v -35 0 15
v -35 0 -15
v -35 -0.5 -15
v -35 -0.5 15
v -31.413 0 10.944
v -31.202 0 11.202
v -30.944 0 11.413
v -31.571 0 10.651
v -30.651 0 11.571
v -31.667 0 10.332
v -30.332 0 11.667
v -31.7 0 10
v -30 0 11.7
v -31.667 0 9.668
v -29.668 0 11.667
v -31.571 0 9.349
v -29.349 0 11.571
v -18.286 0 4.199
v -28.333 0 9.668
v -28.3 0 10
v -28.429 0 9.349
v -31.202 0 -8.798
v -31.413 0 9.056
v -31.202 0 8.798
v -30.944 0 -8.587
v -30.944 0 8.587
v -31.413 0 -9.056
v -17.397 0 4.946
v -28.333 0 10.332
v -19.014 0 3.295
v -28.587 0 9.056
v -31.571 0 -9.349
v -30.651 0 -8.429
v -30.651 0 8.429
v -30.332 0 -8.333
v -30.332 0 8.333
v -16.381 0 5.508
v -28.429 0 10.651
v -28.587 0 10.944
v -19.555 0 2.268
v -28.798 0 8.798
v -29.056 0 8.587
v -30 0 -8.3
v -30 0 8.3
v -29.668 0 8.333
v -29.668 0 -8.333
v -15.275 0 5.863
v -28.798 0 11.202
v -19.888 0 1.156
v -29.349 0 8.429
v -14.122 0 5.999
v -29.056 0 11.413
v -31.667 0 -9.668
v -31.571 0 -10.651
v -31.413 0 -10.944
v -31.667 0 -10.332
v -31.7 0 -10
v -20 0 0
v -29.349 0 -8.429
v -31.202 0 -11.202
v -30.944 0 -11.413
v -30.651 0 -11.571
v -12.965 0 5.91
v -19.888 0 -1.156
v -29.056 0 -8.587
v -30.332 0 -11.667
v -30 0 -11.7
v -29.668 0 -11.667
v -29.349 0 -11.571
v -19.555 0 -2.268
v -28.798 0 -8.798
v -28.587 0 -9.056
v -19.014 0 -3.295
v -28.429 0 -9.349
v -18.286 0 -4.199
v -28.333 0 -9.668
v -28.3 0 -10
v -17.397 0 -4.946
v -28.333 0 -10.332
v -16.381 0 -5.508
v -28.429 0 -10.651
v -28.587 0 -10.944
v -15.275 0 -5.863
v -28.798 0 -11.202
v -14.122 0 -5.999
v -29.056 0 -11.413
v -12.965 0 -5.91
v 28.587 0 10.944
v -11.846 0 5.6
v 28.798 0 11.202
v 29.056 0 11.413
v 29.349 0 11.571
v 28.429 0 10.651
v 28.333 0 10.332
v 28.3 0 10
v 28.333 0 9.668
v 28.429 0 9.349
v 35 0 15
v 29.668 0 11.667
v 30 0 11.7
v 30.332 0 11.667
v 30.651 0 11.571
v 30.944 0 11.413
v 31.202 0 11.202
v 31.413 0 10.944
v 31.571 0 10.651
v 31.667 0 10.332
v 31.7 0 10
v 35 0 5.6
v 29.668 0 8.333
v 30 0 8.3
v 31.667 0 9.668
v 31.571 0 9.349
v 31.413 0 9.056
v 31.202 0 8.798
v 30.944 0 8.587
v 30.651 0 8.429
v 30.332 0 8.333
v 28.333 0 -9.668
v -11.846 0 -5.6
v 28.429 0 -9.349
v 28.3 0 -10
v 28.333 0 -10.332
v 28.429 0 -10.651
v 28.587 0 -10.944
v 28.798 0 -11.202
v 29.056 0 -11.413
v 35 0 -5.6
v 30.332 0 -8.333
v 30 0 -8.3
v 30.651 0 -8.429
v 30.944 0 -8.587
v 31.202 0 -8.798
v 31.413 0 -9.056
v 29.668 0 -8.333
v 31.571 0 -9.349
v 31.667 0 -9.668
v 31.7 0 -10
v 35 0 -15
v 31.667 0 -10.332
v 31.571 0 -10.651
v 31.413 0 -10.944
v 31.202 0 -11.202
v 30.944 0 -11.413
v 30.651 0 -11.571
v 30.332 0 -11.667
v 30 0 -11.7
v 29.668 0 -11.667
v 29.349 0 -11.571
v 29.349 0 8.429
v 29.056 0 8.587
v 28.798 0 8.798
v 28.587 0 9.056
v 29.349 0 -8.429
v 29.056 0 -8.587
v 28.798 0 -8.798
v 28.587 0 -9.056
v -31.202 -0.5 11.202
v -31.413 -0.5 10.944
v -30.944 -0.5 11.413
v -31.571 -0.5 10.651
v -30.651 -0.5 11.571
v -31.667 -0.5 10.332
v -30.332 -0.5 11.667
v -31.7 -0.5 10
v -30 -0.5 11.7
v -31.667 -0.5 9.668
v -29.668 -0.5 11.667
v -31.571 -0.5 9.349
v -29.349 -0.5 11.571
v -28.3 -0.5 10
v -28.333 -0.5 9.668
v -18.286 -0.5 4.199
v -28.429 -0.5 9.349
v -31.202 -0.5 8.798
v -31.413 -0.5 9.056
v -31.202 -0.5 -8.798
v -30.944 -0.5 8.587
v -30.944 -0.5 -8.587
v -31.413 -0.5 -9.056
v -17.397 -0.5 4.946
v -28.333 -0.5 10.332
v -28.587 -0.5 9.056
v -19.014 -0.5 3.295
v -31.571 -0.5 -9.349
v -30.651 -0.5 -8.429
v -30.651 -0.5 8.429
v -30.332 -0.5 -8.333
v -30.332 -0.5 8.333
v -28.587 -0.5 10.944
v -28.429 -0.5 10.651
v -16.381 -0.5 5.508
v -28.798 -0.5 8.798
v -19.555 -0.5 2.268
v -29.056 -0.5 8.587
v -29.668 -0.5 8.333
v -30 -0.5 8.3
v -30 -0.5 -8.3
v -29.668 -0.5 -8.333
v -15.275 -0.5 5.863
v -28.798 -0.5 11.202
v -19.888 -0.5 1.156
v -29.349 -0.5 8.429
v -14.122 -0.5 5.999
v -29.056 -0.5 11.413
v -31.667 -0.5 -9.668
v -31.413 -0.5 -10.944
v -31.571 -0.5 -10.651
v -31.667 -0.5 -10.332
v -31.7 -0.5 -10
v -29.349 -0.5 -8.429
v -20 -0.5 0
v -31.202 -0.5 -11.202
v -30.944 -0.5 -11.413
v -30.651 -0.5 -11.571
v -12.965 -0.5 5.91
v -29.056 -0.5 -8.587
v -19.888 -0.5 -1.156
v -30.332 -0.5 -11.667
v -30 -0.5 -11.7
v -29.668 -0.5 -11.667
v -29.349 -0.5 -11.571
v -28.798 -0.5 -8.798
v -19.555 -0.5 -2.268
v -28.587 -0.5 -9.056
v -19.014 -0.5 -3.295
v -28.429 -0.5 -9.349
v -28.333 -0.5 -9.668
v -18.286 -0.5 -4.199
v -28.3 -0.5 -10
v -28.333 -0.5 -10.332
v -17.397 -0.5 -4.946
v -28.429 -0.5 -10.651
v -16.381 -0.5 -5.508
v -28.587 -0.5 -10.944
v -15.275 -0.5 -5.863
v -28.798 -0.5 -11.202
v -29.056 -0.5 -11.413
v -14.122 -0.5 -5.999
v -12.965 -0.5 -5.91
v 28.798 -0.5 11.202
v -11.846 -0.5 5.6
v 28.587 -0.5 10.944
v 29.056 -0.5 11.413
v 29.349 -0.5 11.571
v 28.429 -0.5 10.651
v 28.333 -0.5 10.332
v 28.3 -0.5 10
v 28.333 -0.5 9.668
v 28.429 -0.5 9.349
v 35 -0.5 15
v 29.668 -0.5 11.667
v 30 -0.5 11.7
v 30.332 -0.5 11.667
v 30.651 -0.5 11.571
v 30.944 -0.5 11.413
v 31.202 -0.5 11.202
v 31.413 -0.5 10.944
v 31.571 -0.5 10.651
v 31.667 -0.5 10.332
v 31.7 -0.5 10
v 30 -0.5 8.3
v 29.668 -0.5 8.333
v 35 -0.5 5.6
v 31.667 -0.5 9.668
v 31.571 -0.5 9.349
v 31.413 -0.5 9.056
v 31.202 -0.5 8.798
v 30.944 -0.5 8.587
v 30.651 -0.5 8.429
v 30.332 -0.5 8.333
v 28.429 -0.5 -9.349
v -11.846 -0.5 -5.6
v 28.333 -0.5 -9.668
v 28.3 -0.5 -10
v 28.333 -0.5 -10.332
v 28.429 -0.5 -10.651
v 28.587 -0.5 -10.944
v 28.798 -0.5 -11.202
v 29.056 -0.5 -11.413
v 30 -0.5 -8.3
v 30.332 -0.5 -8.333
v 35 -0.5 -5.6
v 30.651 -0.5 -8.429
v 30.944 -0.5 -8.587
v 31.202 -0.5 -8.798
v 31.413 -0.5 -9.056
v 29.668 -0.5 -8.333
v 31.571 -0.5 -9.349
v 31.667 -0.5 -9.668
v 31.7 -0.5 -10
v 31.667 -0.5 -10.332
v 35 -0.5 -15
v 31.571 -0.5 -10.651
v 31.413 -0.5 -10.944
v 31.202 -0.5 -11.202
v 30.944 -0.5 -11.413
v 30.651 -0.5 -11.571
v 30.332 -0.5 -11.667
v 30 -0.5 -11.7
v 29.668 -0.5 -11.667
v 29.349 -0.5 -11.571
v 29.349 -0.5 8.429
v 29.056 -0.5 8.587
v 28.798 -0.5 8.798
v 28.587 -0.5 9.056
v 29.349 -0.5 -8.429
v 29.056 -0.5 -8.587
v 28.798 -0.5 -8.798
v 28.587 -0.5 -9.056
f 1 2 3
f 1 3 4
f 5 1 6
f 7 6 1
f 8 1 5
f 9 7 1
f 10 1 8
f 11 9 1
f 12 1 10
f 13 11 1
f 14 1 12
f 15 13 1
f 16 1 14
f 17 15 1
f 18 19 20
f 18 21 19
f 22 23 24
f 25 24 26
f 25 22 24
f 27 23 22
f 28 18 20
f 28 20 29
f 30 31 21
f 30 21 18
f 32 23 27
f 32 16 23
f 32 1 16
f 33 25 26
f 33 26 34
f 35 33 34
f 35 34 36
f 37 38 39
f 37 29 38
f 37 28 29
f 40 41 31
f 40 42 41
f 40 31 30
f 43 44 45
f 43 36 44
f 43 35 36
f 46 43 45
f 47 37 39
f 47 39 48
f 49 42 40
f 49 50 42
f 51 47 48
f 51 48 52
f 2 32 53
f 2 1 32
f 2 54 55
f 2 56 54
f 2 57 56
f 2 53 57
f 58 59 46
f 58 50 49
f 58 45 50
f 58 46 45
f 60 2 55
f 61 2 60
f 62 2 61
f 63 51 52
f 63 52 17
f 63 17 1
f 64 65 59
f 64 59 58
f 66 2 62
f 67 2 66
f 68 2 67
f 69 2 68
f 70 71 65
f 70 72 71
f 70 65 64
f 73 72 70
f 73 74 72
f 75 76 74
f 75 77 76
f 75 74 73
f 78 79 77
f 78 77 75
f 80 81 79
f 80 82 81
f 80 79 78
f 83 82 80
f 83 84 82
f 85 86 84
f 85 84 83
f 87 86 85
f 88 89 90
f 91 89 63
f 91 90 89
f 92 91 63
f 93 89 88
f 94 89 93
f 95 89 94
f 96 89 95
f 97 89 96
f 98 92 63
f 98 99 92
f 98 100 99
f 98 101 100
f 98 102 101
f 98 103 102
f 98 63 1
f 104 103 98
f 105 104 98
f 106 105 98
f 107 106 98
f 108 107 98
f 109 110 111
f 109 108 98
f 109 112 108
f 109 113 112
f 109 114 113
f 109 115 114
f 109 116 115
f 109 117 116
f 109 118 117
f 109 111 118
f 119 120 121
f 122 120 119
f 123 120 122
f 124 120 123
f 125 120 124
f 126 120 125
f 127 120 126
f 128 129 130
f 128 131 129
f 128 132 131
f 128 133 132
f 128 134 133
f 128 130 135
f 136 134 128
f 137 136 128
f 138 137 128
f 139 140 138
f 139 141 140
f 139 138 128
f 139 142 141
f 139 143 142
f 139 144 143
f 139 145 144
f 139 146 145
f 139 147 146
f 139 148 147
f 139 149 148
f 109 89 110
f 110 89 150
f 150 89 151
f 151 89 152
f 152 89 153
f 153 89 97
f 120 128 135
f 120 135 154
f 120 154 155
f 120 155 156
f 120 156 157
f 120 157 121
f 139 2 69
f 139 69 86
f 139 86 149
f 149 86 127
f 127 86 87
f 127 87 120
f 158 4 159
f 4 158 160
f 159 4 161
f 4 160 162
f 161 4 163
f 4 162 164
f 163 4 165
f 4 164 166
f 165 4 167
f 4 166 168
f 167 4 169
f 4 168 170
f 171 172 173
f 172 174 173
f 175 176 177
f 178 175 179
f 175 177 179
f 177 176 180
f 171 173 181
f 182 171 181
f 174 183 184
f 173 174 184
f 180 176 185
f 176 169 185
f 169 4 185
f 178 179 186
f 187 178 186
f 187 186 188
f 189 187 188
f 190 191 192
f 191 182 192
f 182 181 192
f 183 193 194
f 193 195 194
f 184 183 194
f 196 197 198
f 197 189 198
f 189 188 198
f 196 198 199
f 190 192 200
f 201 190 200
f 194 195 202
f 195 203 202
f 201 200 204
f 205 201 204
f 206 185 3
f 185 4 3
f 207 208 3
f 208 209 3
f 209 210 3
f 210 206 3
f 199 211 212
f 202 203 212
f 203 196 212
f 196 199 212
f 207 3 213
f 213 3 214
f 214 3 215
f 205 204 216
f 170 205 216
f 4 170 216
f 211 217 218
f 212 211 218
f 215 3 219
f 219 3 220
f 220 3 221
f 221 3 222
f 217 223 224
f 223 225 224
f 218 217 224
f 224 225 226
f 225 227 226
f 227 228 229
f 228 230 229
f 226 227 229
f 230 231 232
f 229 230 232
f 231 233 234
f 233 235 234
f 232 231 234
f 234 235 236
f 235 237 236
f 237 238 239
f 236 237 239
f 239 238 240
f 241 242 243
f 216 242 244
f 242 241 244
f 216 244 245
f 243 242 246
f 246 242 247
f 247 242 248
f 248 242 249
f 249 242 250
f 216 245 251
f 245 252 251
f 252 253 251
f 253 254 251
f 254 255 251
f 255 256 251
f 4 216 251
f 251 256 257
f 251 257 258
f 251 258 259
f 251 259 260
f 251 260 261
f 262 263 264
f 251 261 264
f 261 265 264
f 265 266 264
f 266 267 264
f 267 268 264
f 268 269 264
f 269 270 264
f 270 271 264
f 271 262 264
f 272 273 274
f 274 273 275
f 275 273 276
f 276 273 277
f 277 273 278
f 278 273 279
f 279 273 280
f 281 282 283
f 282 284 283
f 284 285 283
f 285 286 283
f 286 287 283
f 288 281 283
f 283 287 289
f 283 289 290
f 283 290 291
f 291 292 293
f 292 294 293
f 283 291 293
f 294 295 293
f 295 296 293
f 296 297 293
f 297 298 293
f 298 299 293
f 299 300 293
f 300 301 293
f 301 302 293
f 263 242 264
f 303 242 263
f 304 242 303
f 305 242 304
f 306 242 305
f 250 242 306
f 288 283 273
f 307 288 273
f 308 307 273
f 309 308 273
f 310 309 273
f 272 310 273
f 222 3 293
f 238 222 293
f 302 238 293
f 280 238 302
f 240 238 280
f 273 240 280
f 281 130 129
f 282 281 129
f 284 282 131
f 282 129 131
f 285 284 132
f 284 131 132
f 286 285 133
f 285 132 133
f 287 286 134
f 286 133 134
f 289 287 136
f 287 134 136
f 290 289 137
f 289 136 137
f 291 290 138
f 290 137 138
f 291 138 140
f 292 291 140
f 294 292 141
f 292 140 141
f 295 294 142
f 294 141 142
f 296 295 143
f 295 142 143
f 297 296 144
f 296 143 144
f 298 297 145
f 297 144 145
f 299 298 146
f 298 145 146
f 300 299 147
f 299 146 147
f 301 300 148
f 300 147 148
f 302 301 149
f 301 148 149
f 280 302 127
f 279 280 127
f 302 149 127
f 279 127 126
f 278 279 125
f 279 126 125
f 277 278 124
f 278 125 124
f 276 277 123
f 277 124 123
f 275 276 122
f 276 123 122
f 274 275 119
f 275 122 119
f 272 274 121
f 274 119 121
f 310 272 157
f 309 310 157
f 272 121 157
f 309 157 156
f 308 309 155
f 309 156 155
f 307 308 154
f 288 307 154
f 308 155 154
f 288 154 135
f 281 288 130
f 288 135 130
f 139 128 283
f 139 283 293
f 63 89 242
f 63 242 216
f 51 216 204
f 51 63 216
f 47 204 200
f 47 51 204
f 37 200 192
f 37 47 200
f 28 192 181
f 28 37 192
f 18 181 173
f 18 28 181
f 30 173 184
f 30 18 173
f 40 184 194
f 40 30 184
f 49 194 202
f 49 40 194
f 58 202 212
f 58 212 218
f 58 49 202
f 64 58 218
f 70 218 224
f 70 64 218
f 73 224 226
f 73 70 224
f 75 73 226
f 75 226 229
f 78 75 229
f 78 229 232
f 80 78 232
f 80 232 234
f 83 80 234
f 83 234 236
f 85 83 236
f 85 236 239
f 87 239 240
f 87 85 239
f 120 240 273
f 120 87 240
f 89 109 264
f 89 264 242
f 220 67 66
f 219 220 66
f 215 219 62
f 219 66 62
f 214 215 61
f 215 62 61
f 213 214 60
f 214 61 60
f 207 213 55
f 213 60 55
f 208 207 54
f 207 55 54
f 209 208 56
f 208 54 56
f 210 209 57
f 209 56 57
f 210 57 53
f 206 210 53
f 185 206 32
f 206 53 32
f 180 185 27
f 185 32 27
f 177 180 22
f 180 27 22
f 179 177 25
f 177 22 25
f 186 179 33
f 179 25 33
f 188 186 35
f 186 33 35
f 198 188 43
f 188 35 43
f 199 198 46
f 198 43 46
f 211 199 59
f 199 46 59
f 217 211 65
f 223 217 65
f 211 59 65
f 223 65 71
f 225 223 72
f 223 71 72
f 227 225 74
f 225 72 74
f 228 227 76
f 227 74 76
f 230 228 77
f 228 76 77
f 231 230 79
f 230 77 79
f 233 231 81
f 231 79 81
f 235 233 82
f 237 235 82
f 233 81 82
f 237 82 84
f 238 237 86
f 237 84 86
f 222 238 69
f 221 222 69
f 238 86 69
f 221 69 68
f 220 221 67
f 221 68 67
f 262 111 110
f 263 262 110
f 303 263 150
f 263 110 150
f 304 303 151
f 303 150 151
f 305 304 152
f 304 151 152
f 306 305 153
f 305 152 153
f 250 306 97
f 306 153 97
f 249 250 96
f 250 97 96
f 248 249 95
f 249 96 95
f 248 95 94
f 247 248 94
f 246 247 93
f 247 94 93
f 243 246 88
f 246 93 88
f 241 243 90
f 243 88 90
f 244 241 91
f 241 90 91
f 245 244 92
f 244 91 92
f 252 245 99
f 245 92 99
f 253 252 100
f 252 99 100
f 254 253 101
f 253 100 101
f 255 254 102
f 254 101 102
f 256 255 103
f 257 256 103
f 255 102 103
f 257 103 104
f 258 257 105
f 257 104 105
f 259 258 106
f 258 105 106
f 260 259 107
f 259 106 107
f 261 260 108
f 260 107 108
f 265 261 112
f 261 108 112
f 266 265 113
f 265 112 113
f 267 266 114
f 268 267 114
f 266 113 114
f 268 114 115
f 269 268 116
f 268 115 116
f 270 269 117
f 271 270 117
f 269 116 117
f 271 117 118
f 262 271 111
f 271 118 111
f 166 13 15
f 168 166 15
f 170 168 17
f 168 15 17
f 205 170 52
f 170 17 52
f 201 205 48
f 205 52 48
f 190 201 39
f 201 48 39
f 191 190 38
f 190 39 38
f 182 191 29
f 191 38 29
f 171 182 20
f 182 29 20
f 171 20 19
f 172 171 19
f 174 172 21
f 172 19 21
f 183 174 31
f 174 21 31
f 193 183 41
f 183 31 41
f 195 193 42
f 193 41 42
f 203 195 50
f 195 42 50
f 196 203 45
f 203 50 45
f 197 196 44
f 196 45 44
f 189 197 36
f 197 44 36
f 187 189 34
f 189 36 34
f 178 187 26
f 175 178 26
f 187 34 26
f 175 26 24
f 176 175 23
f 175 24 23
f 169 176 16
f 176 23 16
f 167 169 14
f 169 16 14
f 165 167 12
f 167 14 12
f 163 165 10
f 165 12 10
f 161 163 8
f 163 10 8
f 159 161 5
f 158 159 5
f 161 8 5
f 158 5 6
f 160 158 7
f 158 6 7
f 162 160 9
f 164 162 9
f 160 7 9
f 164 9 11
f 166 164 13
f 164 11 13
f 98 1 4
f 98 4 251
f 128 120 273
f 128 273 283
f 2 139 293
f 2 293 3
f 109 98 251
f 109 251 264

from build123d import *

# Parameters (mm, degrees)
ESQUISSE1_R               = 1.7
T_LE_DE_BASE_PLI_E1_DEPTH = 0.5


# Sheet-metal steps are written as plain solids
with BuildPart() as part:
    # Esquisse1 → Tôle de base pliée1 (new body)
    with BuildSketch(Plane(origin=(0, 0, 0), x_dir=(1, 0, 0), z_dir=(0, 1, 0))):
        with BuildLine():
            Line((-35, -15), (35, -15))
            Line((35, -15), (35, -5.6))
            Line((35, -5.6), (-11.845934077, -5.6))
            ThreePointArc((-11.845934077, -5.6), (-20, 0), (-11.845934077, 5.6))
            Line((-11.845934077, 5.6), (35, 5.6))
            Line((35, 5.6), (35, 15))
            Line((35, 15), (-35, 15))
            Line((-35, 15), (-35, -15))
        make_face()
        with Locations(Location((30, 10, 0), (0, 0, 270))):
            Circle(ESQUISSE1_R, mode=Mode.SUBTRACT)
        with Locations(Location((30, -10, 0), (0, 0, 90))):
            Circle(ESQUISSE1_R, mode=Mode.SUBTRACT)
        with Locations(Location((-30, -10, 0), (0, 0, 270))):
            Circle(ESQUISSE1_R, mode=Mode.SUBTRACT)
        with Locations(Location((-30, 10, 0), (0, 0, 90))):
            Circle(ESQUISSE1_R, mode=Mode.SUBTRACT)
    extrude(amount=-T_LE_DE_BASE_PLI_E1_DEPTH)


solid = part.part
